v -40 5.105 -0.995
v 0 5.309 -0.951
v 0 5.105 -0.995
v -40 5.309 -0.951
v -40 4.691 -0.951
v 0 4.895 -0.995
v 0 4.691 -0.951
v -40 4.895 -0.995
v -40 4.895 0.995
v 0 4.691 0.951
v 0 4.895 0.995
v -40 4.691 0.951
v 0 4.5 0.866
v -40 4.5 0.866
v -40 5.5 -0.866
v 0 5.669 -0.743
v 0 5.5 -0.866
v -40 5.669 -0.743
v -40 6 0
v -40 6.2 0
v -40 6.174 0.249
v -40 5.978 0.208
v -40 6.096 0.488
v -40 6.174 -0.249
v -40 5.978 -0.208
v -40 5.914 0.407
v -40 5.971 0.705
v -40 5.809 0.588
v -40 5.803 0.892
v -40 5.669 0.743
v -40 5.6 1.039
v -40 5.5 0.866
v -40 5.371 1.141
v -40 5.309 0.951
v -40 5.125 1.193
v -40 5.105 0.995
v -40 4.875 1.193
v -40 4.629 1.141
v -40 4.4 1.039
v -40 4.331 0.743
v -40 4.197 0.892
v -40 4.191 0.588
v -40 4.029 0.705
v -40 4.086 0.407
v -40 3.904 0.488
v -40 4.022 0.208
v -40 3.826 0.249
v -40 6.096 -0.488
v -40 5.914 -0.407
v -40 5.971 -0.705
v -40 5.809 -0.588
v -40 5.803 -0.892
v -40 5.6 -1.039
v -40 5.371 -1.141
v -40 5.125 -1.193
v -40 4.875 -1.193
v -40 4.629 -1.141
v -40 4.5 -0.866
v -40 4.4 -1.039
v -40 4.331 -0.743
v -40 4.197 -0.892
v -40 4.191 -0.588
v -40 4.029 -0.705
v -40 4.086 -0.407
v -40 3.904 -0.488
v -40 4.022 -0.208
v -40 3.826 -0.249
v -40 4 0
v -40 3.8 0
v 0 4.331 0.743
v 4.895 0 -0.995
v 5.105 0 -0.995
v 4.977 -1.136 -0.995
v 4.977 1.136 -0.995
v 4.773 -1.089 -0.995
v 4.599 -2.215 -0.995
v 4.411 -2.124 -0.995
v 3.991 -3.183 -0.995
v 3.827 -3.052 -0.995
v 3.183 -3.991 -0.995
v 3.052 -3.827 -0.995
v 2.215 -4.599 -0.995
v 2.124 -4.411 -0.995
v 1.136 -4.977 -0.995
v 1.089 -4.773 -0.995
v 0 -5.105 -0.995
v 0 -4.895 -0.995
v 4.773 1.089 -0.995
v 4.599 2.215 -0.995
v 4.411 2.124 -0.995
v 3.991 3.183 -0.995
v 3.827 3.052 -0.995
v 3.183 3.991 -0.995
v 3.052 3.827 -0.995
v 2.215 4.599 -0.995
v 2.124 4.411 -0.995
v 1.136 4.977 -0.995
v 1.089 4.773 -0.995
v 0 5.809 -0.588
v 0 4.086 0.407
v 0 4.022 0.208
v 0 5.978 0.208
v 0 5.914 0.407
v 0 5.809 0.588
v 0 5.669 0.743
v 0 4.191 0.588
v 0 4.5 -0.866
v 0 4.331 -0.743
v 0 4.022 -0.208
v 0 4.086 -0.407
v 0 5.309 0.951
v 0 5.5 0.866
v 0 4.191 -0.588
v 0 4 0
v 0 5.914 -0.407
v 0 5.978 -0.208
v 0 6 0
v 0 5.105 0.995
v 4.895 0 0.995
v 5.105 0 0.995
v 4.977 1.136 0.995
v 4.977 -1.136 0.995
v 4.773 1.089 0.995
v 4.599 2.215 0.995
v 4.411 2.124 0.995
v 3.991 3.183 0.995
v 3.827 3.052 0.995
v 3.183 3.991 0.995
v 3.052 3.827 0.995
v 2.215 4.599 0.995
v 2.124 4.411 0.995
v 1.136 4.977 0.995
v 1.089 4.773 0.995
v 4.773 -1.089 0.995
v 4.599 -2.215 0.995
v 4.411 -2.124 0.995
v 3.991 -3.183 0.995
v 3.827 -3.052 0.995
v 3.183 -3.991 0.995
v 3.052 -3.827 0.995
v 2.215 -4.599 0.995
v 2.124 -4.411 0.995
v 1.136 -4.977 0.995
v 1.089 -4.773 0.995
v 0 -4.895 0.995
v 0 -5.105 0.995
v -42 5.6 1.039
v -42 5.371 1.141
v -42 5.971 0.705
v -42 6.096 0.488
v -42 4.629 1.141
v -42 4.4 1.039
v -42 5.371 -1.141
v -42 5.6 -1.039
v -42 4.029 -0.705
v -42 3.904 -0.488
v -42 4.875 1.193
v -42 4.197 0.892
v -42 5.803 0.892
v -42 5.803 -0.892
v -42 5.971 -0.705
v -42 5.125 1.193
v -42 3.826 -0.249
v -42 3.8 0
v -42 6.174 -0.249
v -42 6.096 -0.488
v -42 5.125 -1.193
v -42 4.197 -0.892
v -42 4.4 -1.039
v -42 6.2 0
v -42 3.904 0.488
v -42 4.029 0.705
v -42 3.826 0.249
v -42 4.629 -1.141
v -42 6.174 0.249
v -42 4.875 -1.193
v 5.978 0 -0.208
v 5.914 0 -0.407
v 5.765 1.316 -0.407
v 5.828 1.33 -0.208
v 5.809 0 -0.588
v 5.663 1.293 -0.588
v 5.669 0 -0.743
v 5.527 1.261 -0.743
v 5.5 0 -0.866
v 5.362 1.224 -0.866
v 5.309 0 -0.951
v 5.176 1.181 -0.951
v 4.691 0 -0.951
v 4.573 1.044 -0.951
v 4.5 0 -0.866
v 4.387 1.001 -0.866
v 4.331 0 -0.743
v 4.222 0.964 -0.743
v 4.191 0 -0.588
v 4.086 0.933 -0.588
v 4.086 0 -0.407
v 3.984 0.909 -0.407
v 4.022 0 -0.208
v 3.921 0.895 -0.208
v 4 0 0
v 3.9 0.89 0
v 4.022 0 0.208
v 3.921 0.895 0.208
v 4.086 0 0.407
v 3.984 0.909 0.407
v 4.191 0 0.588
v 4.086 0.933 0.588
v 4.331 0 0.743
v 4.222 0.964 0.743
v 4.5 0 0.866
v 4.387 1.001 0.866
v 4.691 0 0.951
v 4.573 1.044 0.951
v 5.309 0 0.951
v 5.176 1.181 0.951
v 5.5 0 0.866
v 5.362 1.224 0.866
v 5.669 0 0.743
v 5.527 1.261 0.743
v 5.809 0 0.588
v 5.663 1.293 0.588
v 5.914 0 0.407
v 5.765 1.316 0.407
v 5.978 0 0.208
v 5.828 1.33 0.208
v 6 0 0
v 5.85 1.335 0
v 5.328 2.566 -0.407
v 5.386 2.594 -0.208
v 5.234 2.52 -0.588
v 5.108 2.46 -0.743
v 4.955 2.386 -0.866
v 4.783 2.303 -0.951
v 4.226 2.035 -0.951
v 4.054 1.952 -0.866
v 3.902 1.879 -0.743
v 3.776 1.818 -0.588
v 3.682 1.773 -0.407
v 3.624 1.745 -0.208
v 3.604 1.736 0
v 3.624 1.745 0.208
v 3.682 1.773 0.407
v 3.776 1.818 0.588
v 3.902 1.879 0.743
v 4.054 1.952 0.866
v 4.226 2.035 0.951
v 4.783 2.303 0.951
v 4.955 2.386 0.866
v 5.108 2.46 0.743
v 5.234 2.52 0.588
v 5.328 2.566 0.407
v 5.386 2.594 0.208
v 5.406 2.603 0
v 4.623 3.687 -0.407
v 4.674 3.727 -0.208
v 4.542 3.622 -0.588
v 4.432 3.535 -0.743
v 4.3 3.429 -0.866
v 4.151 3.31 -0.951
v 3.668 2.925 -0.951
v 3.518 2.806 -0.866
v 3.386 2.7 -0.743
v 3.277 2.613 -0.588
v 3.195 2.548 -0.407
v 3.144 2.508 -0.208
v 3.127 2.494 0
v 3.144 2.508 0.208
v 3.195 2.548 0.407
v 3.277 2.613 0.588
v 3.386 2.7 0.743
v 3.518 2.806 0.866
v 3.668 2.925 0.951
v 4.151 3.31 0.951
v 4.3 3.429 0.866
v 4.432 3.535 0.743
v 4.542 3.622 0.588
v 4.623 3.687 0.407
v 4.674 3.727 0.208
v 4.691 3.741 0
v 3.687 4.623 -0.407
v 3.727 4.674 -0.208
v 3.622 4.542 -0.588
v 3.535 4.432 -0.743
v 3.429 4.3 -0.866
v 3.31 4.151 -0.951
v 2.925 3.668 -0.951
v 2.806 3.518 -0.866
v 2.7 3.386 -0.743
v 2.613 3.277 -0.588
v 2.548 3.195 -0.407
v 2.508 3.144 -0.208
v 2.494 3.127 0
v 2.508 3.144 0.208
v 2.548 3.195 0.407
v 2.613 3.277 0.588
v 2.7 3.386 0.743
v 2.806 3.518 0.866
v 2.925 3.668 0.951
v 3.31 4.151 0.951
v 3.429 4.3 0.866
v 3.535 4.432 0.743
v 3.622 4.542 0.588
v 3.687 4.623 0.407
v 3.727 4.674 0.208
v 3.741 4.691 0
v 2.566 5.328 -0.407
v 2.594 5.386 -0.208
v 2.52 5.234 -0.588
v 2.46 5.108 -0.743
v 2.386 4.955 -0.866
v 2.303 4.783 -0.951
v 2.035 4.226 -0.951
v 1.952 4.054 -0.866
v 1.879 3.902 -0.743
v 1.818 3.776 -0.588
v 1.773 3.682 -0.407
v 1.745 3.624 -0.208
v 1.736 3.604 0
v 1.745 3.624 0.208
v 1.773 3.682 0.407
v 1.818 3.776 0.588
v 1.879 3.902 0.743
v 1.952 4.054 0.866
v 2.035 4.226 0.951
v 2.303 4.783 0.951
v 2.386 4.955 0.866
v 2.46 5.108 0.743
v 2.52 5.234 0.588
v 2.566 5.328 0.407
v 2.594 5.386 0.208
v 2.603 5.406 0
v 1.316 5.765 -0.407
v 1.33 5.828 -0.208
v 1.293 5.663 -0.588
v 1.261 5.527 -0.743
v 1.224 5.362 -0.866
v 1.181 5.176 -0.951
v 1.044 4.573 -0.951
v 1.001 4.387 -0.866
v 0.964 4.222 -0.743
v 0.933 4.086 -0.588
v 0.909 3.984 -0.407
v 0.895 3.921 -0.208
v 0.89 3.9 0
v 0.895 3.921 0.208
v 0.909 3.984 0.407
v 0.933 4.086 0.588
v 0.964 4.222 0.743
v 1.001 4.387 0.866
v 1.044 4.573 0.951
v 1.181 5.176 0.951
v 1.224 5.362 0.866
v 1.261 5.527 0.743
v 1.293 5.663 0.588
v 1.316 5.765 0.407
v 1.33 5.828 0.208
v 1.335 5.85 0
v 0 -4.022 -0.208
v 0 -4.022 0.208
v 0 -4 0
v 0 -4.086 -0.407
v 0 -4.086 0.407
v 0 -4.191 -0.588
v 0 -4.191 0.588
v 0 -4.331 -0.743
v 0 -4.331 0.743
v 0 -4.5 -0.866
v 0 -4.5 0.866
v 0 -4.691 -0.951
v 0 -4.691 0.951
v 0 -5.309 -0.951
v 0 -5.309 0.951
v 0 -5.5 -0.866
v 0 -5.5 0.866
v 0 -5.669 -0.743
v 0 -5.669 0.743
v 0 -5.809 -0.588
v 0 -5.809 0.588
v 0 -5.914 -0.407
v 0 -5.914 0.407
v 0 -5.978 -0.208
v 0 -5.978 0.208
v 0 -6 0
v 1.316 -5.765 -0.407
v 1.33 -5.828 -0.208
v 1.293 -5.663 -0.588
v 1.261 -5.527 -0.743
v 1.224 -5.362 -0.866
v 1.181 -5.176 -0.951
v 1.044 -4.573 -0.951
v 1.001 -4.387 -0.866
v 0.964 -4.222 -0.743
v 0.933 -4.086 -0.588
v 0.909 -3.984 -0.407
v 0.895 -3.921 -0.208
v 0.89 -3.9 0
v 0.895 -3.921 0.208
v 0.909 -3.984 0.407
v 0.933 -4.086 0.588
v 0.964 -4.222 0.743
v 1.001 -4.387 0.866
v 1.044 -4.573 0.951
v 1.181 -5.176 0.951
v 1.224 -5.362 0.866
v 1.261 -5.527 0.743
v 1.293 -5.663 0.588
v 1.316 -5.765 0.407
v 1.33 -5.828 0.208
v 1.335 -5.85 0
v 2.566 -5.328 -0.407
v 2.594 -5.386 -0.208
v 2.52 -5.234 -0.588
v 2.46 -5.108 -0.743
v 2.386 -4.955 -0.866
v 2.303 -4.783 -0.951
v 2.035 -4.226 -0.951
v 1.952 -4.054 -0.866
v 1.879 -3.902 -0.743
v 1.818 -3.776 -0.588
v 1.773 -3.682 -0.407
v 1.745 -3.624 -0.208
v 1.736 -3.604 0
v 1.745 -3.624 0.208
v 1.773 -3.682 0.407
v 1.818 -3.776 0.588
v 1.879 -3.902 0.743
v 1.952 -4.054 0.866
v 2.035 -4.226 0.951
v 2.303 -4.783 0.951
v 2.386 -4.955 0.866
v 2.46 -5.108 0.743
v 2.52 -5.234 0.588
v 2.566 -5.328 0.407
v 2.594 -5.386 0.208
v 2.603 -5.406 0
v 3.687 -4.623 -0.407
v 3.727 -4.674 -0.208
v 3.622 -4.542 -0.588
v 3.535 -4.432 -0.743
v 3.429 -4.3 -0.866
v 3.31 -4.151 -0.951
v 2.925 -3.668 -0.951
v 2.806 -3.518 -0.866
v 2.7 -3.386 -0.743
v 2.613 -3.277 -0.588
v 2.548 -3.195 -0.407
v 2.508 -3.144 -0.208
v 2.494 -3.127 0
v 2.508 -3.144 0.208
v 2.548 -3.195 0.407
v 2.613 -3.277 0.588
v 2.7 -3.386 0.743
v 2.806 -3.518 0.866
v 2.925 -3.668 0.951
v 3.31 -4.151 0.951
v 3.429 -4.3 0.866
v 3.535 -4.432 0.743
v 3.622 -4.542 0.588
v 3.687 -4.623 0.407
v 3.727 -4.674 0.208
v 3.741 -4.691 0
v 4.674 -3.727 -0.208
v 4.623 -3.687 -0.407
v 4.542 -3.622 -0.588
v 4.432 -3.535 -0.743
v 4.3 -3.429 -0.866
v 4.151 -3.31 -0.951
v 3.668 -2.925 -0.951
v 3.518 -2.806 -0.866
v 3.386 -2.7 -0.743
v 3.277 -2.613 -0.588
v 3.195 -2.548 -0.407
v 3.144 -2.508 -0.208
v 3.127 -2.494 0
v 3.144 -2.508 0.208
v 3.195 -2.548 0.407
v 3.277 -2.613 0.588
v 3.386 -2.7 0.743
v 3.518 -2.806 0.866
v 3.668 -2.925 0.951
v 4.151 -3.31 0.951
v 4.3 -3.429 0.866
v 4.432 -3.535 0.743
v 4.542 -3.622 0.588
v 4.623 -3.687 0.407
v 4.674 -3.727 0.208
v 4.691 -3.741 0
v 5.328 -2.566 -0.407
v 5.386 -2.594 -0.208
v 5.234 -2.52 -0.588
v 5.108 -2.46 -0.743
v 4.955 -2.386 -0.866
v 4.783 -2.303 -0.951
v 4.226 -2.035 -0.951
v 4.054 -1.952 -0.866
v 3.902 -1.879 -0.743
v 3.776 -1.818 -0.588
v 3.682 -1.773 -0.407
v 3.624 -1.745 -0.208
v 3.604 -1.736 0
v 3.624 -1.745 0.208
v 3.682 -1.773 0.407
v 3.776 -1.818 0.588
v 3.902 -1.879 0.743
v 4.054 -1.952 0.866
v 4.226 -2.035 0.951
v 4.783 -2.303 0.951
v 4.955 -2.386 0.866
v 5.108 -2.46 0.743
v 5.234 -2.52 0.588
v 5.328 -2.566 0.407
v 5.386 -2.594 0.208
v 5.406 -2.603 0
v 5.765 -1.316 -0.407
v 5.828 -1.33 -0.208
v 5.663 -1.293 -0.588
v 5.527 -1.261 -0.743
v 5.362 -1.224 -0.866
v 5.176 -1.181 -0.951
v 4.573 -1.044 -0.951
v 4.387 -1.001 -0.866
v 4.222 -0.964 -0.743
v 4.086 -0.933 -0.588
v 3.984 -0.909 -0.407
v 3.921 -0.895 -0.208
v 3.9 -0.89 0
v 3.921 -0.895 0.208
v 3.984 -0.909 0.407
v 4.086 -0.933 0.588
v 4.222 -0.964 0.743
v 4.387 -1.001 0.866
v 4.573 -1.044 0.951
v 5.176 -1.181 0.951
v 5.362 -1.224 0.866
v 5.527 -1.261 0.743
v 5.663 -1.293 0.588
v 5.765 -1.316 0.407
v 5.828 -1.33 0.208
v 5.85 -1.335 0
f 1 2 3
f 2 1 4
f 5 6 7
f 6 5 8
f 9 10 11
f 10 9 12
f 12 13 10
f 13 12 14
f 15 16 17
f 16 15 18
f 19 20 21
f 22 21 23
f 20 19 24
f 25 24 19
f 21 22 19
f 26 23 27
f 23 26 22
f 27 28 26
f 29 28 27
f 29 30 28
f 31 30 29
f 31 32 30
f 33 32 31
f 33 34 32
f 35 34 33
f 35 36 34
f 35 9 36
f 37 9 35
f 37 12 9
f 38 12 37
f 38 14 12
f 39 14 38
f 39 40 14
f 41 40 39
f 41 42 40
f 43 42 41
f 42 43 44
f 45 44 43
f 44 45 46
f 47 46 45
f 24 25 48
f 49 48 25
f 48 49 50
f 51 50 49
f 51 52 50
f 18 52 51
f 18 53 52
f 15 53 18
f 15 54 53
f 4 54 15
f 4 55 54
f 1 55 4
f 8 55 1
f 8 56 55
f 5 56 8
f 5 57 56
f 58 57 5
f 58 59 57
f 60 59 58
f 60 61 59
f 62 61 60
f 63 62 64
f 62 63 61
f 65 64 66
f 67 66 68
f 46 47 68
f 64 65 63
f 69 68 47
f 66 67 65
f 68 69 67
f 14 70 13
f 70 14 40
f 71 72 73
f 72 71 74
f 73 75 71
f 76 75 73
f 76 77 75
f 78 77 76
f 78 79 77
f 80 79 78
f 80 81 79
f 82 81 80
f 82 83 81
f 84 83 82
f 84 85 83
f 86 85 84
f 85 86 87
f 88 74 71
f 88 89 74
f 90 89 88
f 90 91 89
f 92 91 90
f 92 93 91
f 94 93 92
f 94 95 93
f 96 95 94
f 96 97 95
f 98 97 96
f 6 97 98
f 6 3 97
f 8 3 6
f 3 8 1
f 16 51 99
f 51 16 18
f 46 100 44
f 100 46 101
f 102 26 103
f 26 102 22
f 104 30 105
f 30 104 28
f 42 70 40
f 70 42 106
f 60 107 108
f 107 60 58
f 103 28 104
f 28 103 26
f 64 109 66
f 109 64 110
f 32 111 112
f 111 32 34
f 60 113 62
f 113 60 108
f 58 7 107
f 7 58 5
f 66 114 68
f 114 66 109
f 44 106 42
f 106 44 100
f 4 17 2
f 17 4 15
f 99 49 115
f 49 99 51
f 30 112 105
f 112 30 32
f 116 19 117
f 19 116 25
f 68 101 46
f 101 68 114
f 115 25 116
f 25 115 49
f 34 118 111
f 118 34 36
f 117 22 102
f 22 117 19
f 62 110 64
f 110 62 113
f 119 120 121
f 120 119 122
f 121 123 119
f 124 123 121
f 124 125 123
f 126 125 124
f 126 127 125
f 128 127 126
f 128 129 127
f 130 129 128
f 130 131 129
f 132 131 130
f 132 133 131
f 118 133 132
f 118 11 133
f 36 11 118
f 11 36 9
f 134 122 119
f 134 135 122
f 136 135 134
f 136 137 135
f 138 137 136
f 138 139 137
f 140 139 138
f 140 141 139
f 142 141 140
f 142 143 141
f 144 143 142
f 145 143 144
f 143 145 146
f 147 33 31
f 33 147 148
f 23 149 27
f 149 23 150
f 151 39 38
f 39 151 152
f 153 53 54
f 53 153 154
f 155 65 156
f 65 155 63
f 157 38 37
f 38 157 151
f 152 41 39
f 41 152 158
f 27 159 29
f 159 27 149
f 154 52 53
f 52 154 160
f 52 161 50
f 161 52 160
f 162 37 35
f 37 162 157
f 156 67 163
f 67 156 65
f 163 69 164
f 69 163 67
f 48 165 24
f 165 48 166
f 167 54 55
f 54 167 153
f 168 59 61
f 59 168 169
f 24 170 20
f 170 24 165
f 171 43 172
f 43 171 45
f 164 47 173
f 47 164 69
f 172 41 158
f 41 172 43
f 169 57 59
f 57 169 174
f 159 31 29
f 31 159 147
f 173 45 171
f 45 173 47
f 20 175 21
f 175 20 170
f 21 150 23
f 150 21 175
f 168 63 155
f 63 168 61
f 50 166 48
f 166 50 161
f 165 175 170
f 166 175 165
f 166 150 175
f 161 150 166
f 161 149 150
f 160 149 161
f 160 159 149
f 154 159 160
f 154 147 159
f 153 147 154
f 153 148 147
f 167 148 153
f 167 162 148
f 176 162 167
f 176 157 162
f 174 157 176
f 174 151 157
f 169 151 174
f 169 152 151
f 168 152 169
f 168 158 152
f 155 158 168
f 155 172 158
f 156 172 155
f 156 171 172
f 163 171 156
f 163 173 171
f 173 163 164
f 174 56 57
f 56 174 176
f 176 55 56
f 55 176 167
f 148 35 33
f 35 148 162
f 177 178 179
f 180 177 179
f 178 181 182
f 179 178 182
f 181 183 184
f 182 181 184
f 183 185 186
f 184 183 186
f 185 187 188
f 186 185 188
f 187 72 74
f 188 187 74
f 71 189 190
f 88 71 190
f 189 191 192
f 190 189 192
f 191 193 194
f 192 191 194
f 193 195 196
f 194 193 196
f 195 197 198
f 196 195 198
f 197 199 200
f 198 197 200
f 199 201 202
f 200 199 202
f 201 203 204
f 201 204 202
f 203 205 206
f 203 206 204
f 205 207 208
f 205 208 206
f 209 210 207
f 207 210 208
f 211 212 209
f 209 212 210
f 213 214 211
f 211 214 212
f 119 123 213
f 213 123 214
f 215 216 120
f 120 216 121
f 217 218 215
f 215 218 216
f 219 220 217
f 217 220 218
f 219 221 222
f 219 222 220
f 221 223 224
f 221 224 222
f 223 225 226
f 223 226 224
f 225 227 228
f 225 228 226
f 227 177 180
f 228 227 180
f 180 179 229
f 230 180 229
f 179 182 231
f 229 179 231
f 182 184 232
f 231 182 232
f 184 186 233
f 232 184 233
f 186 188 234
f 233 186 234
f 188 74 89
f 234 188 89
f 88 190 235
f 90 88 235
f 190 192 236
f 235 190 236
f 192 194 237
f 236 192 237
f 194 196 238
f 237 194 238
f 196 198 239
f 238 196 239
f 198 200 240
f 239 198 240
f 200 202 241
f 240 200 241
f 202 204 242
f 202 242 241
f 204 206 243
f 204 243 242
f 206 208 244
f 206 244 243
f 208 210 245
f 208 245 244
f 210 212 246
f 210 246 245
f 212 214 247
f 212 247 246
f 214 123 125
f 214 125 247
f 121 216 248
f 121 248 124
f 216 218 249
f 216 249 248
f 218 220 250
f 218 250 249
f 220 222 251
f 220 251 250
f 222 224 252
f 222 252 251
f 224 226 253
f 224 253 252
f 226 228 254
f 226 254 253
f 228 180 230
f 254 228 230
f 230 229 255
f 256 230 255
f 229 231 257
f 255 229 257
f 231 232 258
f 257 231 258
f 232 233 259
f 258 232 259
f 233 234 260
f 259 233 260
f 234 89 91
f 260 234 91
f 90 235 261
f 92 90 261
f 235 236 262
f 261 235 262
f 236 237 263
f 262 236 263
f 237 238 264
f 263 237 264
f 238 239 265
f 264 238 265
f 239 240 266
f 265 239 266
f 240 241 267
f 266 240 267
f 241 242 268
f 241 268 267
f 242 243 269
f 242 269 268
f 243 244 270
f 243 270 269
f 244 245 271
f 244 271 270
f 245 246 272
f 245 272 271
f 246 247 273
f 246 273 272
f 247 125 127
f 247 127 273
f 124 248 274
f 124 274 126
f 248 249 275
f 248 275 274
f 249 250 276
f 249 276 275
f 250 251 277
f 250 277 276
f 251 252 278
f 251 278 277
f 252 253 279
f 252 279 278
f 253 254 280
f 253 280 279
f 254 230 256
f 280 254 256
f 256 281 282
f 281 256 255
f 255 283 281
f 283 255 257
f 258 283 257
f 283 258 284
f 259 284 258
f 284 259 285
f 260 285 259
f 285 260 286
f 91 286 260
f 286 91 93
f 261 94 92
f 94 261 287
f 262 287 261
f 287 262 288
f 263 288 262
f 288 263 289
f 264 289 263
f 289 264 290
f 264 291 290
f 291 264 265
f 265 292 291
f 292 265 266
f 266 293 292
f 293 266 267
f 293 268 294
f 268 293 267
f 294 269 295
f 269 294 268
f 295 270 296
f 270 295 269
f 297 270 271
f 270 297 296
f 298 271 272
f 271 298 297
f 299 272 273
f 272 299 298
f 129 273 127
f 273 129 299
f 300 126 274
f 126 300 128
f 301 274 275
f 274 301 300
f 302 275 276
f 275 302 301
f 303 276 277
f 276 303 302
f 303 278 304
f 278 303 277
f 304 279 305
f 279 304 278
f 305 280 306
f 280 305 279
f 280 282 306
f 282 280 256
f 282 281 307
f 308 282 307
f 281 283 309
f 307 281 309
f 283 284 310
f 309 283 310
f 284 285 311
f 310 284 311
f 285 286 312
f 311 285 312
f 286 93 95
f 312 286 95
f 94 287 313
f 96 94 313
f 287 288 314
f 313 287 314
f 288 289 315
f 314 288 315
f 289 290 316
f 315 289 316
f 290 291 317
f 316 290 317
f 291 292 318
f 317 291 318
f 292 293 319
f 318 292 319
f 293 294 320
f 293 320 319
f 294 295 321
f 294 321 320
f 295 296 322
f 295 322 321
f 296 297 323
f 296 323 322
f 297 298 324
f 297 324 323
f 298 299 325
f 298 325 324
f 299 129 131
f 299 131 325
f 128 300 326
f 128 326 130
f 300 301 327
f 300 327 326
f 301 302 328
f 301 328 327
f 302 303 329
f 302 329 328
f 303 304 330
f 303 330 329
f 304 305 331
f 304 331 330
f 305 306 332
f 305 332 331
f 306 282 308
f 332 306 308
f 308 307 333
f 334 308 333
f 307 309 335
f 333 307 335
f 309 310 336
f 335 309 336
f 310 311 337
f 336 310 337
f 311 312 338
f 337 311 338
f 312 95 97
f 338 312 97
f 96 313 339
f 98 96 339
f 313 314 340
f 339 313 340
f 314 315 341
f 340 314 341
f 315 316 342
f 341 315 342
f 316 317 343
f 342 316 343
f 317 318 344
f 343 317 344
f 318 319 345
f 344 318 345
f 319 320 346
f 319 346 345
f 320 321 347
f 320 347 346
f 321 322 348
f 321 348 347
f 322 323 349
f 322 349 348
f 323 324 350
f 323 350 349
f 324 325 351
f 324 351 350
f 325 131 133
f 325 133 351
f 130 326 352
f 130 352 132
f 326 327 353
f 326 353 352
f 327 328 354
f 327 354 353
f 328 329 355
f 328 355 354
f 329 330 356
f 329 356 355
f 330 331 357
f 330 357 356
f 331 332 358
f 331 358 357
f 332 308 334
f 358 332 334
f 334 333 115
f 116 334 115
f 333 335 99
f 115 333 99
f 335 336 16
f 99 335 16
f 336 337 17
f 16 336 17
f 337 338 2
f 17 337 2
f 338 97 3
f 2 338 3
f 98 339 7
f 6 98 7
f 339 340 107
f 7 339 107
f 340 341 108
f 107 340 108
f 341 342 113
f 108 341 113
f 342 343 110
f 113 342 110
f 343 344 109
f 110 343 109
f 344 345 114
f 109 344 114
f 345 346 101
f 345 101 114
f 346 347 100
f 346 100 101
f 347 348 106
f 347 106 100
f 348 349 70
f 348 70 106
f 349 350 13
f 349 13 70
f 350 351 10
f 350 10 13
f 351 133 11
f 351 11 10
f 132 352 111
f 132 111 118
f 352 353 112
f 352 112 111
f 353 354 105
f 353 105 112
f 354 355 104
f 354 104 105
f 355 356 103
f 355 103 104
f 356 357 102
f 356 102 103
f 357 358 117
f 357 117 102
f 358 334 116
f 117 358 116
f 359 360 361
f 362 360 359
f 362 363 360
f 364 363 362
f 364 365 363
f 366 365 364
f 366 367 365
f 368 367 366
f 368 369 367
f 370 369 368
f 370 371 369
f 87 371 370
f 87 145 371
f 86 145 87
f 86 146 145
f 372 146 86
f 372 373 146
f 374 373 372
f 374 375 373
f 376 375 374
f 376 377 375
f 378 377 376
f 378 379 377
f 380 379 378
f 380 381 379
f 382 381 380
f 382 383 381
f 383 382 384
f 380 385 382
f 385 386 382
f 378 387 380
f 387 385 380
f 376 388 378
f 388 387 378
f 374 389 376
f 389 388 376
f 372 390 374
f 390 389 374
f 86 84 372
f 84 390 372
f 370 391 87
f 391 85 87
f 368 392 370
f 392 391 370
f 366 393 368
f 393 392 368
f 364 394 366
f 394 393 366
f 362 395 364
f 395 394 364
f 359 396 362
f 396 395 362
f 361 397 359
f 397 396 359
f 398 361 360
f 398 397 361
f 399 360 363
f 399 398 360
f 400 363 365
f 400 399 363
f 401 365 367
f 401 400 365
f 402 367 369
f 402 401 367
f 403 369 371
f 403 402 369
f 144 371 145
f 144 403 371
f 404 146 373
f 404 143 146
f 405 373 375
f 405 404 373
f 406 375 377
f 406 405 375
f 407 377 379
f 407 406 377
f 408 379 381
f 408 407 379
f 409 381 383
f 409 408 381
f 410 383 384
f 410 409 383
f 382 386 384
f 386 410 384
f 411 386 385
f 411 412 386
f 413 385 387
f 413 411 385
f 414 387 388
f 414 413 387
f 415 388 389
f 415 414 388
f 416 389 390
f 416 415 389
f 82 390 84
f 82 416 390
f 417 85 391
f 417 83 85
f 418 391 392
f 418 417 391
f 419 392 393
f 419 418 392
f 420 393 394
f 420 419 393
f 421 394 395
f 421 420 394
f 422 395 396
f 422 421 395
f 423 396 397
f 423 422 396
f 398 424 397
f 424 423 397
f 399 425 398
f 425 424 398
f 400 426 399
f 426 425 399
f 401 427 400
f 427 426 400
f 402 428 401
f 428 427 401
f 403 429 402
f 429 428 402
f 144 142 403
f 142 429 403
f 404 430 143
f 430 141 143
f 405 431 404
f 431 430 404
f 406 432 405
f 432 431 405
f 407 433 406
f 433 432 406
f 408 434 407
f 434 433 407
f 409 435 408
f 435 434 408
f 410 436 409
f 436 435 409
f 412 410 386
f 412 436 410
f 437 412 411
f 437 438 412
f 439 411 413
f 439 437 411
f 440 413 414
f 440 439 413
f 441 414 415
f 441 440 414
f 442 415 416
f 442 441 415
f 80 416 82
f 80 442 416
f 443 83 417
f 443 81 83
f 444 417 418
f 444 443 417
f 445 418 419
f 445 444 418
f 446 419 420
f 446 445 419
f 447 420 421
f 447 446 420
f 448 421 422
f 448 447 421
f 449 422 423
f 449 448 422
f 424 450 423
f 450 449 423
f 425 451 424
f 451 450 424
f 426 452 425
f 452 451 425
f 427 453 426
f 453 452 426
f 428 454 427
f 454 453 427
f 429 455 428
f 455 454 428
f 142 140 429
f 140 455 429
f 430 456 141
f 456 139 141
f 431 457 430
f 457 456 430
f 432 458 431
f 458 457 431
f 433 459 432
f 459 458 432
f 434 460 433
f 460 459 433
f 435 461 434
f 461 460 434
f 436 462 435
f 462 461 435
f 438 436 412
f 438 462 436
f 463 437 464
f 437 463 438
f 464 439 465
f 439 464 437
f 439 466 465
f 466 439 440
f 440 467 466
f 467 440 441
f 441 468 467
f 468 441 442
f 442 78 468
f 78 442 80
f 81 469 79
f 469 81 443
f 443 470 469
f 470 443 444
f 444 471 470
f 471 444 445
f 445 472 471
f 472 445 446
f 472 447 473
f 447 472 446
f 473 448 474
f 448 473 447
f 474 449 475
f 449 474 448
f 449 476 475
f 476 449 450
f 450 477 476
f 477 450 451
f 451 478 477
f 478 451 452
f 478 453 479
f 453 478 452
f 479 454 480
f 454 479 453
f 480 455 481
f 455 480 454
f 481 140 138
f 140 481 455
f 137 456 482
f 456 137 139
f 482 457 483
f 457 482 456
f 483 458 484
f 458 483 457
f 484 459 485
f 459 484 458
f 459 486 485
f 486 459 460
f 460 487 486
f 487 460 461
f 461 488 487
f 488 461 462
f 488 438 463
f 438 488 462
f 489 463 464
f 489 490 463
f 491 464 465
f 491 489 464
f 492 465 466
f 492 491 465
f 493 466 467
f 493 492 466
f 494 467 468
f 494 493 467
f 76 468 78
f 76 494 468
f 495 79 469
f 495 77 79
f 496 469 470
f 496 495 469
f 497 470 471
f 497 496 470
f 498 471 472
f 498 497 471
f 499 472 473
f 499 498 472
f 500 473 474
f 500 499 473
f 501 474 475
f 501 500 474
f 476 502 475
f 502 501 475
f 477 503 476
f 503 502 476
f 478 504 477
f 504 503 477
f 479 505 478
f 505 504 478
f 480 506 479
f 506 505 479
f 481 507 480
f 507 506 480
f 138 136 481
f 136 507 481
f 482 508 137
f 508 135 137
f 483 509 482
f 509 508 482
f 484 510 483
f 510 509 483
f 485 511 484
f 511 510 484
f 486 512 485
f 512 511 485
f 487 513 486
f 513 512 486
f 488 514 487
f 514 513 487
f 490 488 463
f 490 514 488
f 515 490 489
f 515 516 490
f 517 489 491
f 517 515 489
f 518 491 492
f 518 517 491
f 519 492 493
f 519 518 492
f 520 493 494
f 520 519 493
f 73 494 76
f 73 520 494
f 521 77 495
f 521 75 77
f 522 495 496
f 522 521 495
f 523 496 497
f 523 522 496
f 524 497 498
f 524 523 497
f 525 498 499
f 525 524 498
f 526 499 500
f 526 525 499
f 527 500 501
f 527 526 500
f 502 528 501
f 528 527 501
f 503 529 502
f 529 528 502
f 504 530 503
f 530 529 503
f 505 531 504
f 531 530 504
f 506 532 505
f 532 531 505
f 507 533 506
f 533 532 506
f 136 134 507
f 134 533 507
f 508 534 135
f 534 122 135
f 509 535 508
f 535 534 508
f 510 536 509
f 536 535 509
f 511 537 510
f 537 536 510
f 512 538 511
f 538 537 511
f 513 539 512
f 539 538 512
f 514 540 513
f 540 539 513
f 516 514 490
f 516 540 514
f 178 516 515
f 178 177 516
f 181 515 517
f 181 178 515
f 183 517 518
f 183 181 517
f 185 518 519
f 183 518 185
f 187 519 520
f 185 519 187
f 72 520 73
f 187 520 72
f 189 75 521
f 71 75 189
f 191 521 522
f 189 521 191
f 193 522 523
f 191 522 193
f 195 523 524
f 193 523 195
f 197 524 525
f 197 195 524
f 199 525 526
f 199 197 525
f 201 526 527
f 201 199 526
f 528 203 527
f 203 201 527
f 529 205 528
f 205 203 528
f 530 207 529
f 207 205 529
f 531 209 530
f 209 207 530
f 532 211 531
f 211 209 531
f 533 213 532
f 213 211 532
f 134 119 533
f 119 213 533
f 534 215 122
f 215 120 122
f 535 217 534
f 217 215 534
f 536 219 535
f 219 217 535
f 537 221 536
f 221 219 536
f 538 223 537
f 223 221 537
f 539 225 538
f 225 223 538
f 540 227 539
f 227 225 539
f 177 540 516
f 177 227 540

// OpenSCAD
module Walking_Stick(){

    module shaft(){ 
        color("#56483c"){
            translate([0,5,0])
            rotate([30,0,0])
            rotate([0,-90,0])
            linear_extrude(height = 40, $fn = 30) 
            circle(r = 1);
        }
                  
        color("#2a393e"){  
            translate([-40,5,0]){
            color("#a8b0b2")
            rotate([30,0,0])
            rotate([0,-90,0])
            
            linear_extrude(height = 2, $fn = 30) 
            circle(r = 1.2);
            } 
        }
      
    }
     
    shaft();
          
    color("#56483c"){
        rotate_extrude(angle = 90, $fn = 30)
        translate([5,0,0])
        circle(r = 1); 
    }
           
    color("#56483c"){
        rotate([0,0,-90])
        rotate_extrude(angle = 90, $fn = 30)
        translate([5,0,0])
        circle(r = 1);
    }
  
}

Walking_Stick();


// Written by Nicolì Angelo (Gengio) 2024: 
// MIT License

//Permission is hereby granted, free of charge, to any person obtaining a copy of this software and associated documentation files (the "Software"), to deal in the Software without restriction, including without limitation the rights to use, copy, modify, merge, publish, distribute, sublicense, and/or sell copies of the Software, and to permit persons to whom the Software is furnished to do so, subject to the following conditions:

//The above copyright notice and this permission notice shall be included in all copies or substantial portions of the Software.

//THE SOFTWARE IS PROVIDED "AS IS", WITHOUT WARRANTY OF ANY KIND, EXPRESS OR IMPLIED, INCLUDING BUT NOT LIMITED TO THE WARRANTIES OF MERCHANTABILITY, FITNESS FOR A PARTICULAR PURPOSE AND NONINFRINGEMENT. IN NO EVENT SHALL THE AUTHORS OR COPYRIGHT HOLDERS BE LIABLE FOR ANY CLAIM, DAMAGES OR OTHER LIABILITY, WHETHER IN AN ACTION OF CONTRACT, TORT OR OTHERWISE, ARISING FROM, OUT OF OR IN CONNECTION WITH THE SOFTWARE OR THE USE OR OTHER DEALINGS IN THE SOFTWARE.
